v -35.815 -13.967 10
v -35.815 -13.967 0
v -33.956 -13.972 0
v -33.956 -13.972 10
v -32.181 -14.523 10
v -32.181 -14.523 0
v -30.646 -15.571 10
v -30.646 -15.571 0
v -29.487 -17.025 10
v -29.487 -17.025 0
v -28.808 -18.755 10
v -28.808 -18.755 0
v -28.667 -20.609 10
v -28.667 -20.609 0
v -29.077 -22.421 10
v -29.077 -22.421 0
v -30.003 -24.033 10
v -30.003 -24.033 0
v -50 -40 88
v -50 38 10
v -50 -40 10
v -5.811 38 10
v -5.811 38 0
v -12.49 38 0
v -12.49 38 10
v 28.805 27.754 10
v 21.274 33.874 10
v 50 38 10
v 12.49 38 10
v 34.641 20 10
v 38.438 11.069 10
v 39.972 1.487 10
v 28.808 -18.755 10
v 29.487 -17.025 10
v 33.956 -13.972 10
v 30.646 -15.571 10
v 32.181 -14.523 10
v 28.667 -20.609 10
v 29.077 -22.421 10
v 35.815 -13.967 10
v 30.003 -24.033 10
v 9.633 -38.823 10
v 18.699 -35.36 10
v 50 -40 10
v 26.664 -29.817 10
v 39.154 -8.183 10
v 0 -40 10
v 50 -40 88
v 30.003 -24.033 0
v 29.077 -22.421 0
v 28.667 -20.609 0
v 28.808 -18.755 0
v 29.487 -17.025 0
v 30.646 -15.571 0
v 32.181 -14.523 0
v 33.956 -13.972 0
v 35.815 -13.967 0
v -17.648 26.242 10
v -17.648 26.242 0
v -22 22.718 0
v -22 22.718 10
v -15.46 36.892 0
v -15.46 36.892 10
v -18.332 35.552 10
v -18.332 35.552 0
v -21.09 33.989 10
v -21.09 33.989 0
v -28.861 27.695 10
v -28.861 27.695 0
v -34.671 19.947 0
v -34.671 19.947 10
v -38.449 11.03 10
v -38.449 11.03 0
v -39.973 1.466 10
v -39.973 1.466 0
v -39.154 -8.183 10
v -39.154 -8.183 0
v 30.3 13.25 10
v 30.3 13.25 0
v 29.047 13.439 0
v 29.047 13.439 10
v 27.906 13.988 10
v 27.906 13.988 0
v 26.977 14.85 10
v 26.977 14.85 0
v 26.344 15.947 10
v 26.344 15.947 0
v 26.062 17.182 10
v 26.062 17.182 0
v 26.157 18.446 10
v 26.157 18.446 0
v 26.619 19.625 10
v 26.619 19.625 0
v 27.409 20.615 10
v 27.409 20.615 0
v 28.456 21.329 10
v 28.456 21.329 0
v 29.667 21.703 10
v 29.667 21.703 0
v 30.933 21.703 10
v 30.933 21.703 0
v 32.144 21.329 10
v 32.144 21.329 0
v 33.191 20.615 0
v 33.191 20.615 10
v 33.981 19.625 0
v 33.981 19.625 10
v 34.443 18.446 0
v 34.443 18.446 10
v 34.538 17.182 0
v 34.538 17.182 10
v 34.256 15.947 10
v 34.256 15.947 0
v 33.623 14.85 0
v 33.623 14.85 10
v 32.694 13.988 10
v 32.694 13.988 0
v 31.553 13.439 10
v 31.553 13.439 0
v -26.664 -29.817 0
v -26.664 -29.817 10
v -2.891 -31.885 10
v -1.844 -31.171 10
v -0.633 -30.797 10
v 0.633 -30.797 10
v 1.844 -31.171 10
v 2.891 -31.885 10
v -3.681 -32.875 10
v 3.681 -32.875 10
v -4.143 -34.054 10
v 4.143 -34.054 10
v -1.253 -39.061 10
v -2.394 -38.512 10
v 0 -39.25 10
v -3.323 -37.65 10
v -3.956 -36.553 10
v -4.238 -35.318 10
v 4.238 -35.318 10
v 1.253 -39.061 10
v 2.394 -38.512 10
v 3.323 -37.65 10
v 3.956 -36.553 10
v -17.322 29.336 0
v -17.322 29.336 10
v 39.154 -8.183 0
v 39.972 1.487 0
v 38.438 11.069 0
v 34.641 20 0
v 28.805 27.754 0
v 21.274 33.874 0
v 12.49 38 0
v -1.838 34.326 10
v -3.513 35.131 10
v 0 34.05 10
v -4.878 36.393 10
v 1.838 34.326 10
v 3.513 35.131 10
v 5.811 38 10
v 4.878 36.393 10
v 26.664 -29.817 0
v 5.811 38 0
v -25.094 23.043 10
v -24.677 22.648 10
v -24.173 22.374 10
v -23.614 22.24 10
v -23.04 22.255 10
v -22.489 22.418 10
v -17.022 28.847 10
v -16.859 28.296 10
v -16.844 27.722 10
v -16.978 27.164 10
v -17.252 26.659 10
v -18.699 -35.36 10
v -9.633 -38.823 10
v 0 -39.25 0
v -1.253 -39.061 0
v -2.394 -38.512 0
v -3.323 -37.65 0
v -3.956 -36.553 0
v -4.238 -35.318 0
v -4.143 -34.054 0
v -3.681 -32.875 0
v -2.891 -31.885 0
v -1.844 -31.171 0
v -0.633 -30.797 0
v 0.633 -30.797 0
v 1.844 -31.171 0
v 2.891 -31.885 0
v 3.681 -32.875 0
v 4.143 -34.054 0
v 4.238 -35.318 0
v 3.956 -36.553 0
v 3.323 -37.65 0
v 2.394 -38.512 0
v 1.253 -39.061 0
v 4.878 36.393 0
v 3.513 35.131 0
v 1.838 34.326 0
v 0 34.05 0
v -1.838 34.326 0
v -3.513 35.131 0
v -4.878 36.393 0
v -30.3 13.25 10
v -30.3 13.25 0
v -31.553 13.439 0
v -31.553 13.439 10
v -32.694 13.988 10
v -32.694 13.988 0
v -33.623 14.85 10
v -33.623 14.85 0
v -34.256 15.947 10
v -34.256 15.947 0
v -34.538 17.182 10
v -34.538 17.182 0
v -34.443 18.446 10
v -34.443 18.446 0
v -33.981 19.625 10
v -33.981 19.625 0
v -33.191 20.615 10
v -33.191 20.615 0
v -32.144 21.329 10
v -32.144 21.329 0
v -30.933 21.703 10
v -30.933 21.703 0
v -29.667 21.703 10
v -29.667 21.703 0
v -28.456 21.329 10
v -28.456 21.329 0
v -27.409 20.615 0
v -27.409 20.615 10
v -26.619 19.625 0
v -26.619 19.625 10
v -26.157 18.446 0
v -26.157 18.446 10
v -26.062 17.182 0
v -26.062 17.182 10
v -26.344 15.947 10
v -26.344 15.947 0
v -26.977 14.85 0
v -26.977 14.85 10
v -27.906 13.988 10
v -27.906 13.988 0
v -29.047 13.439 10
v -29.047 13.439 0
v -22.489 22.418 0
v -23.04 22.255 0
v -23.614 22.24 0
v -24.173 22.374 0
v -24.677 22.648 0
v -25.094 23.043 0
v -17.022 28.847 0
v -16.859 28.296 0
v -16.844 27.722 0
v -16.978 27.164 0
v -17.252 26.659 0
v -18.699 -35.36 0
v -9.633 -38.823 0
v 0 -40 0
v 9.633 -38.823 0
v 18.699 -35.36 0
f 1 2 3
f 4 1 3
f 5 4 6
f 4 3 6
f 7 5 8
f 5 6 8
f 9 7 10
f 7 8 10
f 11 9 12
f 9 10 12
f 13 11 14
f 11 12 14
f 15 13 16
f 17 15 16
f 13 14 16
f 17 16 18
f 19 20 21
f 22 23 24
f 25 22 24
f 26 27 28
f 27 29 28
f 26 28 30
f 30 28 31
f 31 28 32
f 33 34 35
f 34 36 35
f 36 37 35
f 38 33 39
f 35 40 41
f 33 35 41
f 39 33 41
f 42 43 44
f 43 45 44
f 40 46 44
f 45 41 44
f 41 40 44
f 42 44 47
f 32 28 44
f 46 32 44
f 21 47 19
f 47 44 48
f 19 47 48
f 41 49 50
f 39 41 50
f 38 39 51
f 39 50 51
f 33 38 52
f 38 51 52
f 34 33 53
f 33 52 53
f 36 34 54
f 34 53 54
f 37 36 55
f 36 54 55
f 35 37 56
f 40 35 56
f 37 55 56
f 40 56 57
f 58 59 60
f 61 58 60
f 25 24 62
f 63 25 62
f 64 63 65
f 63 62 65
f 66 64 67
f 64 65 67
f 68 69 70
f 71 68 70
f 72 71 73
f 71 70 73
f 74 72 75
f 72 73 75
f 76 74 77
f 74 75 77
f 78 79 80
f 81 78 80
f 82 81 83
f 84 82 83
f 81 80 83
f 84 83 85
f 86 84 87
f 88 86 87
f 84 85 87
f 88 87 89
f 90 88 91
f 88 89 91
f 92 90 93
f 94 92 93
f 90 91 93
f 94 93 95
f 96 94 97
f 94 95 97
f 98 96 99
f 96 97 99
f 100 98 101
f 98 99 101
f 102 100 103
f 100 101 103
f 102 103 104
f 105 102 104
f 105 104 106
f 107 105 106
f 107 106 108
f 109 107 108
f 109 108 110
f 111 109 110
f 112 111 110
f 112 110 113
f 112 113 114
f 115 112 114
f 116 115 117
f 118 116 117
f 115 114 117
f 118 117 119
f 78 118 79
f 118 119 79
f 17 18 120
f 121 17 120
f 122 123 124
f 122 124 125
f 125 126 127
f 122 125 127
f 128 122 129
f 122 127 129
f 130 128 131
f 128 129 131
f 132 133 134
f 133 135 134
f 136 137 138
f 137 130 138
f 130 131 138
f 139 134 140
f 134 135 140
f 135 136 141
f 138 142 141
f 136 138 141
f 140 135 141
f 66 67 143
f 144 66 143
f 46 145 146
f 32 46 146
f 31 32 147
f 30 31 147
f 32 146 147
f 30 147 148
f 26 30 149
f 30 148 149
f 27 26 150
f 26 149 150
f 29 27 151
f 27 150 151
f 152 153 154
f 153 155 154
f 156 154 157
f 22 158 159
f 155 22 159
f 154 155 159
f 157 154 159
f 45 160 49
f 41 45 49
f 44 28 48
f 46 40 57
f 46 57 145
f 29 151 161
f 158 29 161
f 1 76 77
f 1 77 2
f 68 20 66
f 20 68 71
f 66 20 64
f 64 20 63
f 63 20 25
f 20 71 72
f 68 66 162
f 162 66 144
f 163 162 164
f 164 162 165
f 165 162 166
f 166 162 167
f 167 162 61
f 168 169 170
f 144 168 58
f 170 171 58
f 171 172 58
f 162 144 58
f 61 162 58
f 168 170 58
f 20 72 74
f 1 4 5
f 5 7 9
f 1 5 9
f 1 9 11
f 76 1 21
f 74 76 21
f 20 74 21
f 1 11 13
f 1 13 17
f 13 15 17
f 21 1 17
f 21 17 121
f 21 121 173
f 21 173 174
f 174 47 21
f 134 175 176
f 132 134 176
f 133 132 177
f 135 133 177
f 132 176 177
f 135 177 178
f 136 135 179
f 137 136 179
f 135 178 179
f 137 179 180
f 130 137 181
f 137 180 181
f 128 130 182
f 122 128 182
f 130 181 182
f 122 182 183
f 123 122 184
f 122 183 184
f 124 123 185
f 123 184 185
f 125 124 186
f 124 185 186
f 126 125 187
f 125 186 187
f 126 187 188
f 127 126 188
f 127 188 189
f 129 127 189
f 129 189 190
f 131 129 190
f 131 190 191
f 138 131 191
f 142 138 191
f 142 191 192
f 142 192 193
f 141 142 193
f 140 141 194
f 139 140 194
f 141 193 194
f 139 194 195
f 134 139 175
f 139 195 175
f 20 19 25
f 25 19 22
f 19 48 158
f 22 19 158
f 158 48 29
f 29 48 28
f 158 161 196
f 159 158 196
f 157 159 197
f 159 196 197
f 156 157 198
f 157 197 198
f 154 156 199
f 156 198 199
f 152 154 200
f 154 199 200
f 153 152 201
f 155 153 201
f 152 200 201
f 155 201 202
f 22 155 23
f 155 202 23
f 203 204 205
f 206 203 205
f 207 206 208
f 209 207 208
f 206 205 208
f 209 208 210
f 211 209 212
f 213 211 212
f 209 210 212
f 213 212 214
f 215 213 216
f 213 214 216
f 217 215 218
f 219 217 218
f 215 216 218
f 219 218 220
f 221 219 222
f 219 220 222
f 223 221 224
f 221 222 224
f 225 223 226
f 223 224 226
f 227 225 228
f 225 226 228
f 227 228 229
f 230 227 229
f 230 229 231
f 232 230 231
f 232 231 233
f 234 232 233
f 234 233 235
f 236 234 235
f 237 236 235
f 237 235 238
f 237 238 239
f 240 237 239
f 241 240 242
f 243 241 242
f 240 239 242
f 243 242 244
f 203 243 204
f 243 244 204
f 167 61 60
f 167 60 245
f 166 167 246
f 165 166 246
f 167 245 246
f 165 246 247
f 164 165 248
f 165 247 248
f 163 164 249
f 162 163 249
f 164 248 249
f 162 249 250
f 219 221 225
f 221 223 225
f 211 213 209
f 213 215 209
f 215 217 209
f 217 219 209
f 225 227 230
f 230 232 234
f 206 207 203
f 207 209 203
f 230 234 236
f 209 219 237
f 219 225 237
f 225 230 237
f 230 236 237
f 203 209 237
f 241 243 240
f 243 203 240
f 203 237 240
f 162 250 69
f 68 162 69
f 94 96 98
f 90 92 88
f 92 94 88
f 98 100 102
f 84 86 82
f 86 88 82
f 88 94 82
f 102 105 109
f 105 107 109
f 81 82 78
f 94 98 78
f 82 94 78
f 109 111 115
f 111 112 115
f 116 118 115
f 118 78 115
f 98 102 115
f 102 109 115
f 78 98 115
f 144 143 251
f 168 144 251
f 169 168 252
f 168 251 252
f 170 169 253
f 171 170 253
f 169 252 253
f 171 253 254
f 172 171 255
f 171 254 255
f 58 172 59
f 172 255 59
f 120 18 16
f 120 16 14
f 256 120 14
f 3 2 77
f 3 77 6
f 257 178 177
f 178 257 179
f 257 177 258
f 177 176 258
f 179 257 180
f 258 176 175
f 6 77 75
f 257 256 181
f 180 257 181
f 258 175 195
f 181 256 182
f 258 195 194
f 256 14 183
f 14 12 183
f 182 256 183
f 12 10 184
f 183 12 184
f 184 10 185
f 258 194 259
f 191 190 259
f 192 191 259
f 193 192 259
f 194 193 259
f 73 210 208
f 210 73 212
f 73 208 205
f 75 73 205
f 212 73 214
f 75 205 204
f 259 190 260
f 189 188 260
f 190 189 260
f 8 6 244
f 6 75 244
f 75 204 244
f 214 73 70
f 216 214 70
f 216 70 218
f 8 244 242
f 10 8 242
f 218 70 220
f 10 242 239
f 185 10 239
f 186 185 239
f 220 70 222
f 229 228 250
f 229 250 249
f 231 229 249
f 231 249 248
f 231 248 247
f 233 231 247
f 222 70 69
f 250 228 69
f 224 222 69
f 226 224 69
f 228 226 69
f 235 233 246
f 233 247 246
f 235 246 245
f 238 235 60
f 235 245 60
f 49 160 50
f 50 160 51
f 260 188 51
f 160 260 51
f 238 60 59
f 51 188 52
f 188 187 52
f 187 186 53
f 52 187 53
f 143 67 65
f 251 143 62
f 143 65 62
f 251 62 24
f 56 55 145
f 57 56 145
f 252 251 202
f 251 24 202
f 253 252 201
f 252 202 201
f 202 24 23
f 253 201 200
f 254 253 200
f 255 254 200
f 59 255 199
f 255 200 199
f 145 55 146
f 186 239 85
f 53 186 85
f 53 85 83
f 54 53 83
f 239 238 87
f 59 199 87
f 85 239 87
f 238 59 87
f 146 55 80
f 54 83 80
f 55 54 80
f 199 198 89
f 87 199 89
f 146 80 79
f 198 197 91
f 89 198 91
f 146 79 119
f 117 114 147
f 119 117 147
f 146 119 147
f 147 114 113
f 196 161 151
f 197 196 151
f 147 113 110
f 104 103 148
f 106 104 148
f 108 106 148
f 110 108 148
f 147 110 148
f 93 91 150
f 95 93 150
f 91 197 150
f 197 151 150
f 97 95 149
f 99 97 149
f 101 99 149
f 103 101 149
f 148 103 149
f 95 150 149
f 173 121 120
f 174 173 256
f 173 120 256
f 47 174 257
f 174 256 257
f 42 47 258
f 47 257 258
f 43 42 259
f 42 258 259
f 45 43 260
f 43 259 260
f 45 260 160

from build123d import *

# Parameters (mm, degrees)
ESTRUSIONE_ESTRUSIONE2_DEPTH = 10
ESTRUSIONE_ESTRUSIONE3_DEPTH = 50


with BuildPart() as part:
    # Schizzo4 → Estrusione-Estrusione2 (new body)
    with BuildSketch(Plane.XY):
        with BuildLine():
            ThreePointArc((5.811411188, 38), (0, 34.05), (-5.811411188, 38))
            Line((-5.811411188, 38), (-12.489995997, 38))
            ThreePointArc((-12.489995997, 38), (-16.909196271, 36.250228709), (-21.089648938, 33.988626151))
            Line((-21.089648938, 33.988626151), (-17.322367371, 29.336420856))
            ThreePointArc((-17.322367371, 29.336420856), (-16.844140316, 27.721953377), (-17.647583626, 26.242194881))
            Line((-17.647583626, 26.242194881), (-21.99960101, 22.718000691))
            ThreePointArc((-21.99960101, 22.718000691), (-23.61406849, 22.239773636), (-25.093826986, 23.043216946))
            Line((-25.093826986, 23.043216946), (-28.861108553, 27.695422241))
            ThreePointArc((-28.861108553, 27.695422241), (-38.449109313, 11.03023087), (-39.153963342, -8.183346174))
            Line((-39.153963342, -8.183346174), (-35.814606143, -13.967282507))
            ThreePointArc((-35.814606143, -13.967282507), (-29.487341226, -17.025), (-30.002912658, -24.033430901))
            Line((-30.002912658, -24.033430901), (-26.663967345, -29.816653826))
            ThreePointArc((-26.663967345, -29.816653826), (0, -40), (26.663967345, -29.816653826))
            Line((26.663967345, -29.816653826), (30.002912658, -24.033430901))
            ThreePointArc((30.002912658, -24.033430901), (29.487341226, -17.025), (35.814606143, -13.967282507))
            Line((35.814606143, -13.967282507), (39.153963342, -8.183346174))
            ThreePointArc((39.153963342, -8.183346174), (34.641016151, 20), (12.489995997, 38))
            Line((12.489995997, 38), (5.811411188, 38))
        make_face()
        with BuildLine():
            ThreePointArc((-9, -33.621), (-10.621, -32), (-9, -30.379))
            ThreePointArc((-9, -30.379), (-7.379, -32), (-9, -33.621))
        make_face(mode=Mode.SUBTRACT)
        with BuildLine():
            ThreePointArc((9, -33.621), (7.379, -32), (9, -30.379))
            ThreePointArc((9, -30.379), (10.621, -32), (9, -33.621))
        make_face(mode=Mode.SUBTRACT)
        with BuildLine():
            ThreePointArc((-30.3, 21.75), (-26.05, 17.5), (-30.3, 13.25))
            ThreePointArc((-30.3, 13.25), (-34.55, 17.5), (-30.3, 21.75))
        make_face(mode=Mode.SUBTRACT)
        with BuildLine():
            ThreePointArc((30.3, 21.75), (34.55, 17.5), (30.3, 13.25))
            ThreePointArc((30.3, 13.25), (26.05, 17.5), (30.3, 21.75))
        make_face(mode=Mode.SUBTRACT)
        with BuildLine():
            ThreePointArc((0, -30.75), (4.25, -35), (0, -39.25))
            ThreePointArc((0, -39.25), (-4.25, -35), (0, -30.75))
        make_face(mode=Mode.SUBTRACT)
        with BuildLine():
            ThreePointArc((-35, -3.5), (-38.5, 0), (-35, 3.5))
            ThreePointArc((-35, 3.5), (-31.5, 0), (-35, -3.5))
        make_face(mode=Mode.SUBTRACT)
        with BuildLine():
            ThreePointArc((35, -3.5), (31.5, 0), (35, 3.5))
            ThreePointArc((35, 3.5), (38.5, 0), (35, -3.5))
        make_face(mode=Mode.SUBTRACT)
        with BuildLine():
            ThreePointArc((0, 27.5), (27.5, 0), (0, -27.5))
            ThreePointArc((0, -27.5), (-27.5, 0), (0, 27.5))
        make_face(mode=Mode.SUBTRACT)
        with BuildLine():
            ThreePointArc((25, 22.933), (22.933, 25), (25, 27.067))
            ThreePointArc((25, 27.067), (27.067, 25), (25, 22.933))
        make_face(mode=Mode.SUBTRACT)
        with BuildLine():
            ThreePointArc((0, -27.5), (-27.5, 0), (0, 27.5))
            ThreePointArc((0, 27.5), (27.5, 0), (0, -27.5))
        make_face()
        with BuildLine():
            ThreePointArc((-35, 3.5), (-31.5, 0), (-35, -3.5))
            ThreePointArc((-35, -3.5), (-38.5, 0), (-35, 3.5))
        make_face()
        with BuildLine():
            ThreePointArc((9, -30.379), (10.621, -32), (9, -33.621))
            ThreePointArc((9, -33.621), (7.379, -32), (9, -30.379))
        make_face()
        with BuildLine():
            ThreePointArc((-9, -30.379), (-7.379, -32), (-9, -33.621))
            ThreePointArc((-9, -33.621), (-10.621, -32), (-9, -30.379))
        make_face()
        with BuildLine():
            ThreePointArc((35, 3.5), (38.5, 0), (35, -3.5))
            ThreePointArc((35, -3.5), (31.5, 0), (35, 3.5))
        make_face()
        with BuildLine():
            ThreePointArc((25, 27.067), (27.067, 25), (25, 22.933))
            ThreePointArc((25, 22.933), (22.933, 25), (25, 27.067))
        make_face()
    extrude(amount=ESTRUSIONE_ESTRUSIONE2_DEPTH)

    # Schizzo5 → Estrusione-Estrusione3 (add, symmetric)
    with BuildSketch(Plane(origin=(0, 0, 0), x_dir=(0, 0, -1), z_dir=(1, 0, 0))):
        Polygon((-10, 38), (-10, -40), (-88, -40), align=None)
    extrude(amount=ESTRUSIONE_ESTRUSIONE3_DEPTH, both=True)


solid = part.part
